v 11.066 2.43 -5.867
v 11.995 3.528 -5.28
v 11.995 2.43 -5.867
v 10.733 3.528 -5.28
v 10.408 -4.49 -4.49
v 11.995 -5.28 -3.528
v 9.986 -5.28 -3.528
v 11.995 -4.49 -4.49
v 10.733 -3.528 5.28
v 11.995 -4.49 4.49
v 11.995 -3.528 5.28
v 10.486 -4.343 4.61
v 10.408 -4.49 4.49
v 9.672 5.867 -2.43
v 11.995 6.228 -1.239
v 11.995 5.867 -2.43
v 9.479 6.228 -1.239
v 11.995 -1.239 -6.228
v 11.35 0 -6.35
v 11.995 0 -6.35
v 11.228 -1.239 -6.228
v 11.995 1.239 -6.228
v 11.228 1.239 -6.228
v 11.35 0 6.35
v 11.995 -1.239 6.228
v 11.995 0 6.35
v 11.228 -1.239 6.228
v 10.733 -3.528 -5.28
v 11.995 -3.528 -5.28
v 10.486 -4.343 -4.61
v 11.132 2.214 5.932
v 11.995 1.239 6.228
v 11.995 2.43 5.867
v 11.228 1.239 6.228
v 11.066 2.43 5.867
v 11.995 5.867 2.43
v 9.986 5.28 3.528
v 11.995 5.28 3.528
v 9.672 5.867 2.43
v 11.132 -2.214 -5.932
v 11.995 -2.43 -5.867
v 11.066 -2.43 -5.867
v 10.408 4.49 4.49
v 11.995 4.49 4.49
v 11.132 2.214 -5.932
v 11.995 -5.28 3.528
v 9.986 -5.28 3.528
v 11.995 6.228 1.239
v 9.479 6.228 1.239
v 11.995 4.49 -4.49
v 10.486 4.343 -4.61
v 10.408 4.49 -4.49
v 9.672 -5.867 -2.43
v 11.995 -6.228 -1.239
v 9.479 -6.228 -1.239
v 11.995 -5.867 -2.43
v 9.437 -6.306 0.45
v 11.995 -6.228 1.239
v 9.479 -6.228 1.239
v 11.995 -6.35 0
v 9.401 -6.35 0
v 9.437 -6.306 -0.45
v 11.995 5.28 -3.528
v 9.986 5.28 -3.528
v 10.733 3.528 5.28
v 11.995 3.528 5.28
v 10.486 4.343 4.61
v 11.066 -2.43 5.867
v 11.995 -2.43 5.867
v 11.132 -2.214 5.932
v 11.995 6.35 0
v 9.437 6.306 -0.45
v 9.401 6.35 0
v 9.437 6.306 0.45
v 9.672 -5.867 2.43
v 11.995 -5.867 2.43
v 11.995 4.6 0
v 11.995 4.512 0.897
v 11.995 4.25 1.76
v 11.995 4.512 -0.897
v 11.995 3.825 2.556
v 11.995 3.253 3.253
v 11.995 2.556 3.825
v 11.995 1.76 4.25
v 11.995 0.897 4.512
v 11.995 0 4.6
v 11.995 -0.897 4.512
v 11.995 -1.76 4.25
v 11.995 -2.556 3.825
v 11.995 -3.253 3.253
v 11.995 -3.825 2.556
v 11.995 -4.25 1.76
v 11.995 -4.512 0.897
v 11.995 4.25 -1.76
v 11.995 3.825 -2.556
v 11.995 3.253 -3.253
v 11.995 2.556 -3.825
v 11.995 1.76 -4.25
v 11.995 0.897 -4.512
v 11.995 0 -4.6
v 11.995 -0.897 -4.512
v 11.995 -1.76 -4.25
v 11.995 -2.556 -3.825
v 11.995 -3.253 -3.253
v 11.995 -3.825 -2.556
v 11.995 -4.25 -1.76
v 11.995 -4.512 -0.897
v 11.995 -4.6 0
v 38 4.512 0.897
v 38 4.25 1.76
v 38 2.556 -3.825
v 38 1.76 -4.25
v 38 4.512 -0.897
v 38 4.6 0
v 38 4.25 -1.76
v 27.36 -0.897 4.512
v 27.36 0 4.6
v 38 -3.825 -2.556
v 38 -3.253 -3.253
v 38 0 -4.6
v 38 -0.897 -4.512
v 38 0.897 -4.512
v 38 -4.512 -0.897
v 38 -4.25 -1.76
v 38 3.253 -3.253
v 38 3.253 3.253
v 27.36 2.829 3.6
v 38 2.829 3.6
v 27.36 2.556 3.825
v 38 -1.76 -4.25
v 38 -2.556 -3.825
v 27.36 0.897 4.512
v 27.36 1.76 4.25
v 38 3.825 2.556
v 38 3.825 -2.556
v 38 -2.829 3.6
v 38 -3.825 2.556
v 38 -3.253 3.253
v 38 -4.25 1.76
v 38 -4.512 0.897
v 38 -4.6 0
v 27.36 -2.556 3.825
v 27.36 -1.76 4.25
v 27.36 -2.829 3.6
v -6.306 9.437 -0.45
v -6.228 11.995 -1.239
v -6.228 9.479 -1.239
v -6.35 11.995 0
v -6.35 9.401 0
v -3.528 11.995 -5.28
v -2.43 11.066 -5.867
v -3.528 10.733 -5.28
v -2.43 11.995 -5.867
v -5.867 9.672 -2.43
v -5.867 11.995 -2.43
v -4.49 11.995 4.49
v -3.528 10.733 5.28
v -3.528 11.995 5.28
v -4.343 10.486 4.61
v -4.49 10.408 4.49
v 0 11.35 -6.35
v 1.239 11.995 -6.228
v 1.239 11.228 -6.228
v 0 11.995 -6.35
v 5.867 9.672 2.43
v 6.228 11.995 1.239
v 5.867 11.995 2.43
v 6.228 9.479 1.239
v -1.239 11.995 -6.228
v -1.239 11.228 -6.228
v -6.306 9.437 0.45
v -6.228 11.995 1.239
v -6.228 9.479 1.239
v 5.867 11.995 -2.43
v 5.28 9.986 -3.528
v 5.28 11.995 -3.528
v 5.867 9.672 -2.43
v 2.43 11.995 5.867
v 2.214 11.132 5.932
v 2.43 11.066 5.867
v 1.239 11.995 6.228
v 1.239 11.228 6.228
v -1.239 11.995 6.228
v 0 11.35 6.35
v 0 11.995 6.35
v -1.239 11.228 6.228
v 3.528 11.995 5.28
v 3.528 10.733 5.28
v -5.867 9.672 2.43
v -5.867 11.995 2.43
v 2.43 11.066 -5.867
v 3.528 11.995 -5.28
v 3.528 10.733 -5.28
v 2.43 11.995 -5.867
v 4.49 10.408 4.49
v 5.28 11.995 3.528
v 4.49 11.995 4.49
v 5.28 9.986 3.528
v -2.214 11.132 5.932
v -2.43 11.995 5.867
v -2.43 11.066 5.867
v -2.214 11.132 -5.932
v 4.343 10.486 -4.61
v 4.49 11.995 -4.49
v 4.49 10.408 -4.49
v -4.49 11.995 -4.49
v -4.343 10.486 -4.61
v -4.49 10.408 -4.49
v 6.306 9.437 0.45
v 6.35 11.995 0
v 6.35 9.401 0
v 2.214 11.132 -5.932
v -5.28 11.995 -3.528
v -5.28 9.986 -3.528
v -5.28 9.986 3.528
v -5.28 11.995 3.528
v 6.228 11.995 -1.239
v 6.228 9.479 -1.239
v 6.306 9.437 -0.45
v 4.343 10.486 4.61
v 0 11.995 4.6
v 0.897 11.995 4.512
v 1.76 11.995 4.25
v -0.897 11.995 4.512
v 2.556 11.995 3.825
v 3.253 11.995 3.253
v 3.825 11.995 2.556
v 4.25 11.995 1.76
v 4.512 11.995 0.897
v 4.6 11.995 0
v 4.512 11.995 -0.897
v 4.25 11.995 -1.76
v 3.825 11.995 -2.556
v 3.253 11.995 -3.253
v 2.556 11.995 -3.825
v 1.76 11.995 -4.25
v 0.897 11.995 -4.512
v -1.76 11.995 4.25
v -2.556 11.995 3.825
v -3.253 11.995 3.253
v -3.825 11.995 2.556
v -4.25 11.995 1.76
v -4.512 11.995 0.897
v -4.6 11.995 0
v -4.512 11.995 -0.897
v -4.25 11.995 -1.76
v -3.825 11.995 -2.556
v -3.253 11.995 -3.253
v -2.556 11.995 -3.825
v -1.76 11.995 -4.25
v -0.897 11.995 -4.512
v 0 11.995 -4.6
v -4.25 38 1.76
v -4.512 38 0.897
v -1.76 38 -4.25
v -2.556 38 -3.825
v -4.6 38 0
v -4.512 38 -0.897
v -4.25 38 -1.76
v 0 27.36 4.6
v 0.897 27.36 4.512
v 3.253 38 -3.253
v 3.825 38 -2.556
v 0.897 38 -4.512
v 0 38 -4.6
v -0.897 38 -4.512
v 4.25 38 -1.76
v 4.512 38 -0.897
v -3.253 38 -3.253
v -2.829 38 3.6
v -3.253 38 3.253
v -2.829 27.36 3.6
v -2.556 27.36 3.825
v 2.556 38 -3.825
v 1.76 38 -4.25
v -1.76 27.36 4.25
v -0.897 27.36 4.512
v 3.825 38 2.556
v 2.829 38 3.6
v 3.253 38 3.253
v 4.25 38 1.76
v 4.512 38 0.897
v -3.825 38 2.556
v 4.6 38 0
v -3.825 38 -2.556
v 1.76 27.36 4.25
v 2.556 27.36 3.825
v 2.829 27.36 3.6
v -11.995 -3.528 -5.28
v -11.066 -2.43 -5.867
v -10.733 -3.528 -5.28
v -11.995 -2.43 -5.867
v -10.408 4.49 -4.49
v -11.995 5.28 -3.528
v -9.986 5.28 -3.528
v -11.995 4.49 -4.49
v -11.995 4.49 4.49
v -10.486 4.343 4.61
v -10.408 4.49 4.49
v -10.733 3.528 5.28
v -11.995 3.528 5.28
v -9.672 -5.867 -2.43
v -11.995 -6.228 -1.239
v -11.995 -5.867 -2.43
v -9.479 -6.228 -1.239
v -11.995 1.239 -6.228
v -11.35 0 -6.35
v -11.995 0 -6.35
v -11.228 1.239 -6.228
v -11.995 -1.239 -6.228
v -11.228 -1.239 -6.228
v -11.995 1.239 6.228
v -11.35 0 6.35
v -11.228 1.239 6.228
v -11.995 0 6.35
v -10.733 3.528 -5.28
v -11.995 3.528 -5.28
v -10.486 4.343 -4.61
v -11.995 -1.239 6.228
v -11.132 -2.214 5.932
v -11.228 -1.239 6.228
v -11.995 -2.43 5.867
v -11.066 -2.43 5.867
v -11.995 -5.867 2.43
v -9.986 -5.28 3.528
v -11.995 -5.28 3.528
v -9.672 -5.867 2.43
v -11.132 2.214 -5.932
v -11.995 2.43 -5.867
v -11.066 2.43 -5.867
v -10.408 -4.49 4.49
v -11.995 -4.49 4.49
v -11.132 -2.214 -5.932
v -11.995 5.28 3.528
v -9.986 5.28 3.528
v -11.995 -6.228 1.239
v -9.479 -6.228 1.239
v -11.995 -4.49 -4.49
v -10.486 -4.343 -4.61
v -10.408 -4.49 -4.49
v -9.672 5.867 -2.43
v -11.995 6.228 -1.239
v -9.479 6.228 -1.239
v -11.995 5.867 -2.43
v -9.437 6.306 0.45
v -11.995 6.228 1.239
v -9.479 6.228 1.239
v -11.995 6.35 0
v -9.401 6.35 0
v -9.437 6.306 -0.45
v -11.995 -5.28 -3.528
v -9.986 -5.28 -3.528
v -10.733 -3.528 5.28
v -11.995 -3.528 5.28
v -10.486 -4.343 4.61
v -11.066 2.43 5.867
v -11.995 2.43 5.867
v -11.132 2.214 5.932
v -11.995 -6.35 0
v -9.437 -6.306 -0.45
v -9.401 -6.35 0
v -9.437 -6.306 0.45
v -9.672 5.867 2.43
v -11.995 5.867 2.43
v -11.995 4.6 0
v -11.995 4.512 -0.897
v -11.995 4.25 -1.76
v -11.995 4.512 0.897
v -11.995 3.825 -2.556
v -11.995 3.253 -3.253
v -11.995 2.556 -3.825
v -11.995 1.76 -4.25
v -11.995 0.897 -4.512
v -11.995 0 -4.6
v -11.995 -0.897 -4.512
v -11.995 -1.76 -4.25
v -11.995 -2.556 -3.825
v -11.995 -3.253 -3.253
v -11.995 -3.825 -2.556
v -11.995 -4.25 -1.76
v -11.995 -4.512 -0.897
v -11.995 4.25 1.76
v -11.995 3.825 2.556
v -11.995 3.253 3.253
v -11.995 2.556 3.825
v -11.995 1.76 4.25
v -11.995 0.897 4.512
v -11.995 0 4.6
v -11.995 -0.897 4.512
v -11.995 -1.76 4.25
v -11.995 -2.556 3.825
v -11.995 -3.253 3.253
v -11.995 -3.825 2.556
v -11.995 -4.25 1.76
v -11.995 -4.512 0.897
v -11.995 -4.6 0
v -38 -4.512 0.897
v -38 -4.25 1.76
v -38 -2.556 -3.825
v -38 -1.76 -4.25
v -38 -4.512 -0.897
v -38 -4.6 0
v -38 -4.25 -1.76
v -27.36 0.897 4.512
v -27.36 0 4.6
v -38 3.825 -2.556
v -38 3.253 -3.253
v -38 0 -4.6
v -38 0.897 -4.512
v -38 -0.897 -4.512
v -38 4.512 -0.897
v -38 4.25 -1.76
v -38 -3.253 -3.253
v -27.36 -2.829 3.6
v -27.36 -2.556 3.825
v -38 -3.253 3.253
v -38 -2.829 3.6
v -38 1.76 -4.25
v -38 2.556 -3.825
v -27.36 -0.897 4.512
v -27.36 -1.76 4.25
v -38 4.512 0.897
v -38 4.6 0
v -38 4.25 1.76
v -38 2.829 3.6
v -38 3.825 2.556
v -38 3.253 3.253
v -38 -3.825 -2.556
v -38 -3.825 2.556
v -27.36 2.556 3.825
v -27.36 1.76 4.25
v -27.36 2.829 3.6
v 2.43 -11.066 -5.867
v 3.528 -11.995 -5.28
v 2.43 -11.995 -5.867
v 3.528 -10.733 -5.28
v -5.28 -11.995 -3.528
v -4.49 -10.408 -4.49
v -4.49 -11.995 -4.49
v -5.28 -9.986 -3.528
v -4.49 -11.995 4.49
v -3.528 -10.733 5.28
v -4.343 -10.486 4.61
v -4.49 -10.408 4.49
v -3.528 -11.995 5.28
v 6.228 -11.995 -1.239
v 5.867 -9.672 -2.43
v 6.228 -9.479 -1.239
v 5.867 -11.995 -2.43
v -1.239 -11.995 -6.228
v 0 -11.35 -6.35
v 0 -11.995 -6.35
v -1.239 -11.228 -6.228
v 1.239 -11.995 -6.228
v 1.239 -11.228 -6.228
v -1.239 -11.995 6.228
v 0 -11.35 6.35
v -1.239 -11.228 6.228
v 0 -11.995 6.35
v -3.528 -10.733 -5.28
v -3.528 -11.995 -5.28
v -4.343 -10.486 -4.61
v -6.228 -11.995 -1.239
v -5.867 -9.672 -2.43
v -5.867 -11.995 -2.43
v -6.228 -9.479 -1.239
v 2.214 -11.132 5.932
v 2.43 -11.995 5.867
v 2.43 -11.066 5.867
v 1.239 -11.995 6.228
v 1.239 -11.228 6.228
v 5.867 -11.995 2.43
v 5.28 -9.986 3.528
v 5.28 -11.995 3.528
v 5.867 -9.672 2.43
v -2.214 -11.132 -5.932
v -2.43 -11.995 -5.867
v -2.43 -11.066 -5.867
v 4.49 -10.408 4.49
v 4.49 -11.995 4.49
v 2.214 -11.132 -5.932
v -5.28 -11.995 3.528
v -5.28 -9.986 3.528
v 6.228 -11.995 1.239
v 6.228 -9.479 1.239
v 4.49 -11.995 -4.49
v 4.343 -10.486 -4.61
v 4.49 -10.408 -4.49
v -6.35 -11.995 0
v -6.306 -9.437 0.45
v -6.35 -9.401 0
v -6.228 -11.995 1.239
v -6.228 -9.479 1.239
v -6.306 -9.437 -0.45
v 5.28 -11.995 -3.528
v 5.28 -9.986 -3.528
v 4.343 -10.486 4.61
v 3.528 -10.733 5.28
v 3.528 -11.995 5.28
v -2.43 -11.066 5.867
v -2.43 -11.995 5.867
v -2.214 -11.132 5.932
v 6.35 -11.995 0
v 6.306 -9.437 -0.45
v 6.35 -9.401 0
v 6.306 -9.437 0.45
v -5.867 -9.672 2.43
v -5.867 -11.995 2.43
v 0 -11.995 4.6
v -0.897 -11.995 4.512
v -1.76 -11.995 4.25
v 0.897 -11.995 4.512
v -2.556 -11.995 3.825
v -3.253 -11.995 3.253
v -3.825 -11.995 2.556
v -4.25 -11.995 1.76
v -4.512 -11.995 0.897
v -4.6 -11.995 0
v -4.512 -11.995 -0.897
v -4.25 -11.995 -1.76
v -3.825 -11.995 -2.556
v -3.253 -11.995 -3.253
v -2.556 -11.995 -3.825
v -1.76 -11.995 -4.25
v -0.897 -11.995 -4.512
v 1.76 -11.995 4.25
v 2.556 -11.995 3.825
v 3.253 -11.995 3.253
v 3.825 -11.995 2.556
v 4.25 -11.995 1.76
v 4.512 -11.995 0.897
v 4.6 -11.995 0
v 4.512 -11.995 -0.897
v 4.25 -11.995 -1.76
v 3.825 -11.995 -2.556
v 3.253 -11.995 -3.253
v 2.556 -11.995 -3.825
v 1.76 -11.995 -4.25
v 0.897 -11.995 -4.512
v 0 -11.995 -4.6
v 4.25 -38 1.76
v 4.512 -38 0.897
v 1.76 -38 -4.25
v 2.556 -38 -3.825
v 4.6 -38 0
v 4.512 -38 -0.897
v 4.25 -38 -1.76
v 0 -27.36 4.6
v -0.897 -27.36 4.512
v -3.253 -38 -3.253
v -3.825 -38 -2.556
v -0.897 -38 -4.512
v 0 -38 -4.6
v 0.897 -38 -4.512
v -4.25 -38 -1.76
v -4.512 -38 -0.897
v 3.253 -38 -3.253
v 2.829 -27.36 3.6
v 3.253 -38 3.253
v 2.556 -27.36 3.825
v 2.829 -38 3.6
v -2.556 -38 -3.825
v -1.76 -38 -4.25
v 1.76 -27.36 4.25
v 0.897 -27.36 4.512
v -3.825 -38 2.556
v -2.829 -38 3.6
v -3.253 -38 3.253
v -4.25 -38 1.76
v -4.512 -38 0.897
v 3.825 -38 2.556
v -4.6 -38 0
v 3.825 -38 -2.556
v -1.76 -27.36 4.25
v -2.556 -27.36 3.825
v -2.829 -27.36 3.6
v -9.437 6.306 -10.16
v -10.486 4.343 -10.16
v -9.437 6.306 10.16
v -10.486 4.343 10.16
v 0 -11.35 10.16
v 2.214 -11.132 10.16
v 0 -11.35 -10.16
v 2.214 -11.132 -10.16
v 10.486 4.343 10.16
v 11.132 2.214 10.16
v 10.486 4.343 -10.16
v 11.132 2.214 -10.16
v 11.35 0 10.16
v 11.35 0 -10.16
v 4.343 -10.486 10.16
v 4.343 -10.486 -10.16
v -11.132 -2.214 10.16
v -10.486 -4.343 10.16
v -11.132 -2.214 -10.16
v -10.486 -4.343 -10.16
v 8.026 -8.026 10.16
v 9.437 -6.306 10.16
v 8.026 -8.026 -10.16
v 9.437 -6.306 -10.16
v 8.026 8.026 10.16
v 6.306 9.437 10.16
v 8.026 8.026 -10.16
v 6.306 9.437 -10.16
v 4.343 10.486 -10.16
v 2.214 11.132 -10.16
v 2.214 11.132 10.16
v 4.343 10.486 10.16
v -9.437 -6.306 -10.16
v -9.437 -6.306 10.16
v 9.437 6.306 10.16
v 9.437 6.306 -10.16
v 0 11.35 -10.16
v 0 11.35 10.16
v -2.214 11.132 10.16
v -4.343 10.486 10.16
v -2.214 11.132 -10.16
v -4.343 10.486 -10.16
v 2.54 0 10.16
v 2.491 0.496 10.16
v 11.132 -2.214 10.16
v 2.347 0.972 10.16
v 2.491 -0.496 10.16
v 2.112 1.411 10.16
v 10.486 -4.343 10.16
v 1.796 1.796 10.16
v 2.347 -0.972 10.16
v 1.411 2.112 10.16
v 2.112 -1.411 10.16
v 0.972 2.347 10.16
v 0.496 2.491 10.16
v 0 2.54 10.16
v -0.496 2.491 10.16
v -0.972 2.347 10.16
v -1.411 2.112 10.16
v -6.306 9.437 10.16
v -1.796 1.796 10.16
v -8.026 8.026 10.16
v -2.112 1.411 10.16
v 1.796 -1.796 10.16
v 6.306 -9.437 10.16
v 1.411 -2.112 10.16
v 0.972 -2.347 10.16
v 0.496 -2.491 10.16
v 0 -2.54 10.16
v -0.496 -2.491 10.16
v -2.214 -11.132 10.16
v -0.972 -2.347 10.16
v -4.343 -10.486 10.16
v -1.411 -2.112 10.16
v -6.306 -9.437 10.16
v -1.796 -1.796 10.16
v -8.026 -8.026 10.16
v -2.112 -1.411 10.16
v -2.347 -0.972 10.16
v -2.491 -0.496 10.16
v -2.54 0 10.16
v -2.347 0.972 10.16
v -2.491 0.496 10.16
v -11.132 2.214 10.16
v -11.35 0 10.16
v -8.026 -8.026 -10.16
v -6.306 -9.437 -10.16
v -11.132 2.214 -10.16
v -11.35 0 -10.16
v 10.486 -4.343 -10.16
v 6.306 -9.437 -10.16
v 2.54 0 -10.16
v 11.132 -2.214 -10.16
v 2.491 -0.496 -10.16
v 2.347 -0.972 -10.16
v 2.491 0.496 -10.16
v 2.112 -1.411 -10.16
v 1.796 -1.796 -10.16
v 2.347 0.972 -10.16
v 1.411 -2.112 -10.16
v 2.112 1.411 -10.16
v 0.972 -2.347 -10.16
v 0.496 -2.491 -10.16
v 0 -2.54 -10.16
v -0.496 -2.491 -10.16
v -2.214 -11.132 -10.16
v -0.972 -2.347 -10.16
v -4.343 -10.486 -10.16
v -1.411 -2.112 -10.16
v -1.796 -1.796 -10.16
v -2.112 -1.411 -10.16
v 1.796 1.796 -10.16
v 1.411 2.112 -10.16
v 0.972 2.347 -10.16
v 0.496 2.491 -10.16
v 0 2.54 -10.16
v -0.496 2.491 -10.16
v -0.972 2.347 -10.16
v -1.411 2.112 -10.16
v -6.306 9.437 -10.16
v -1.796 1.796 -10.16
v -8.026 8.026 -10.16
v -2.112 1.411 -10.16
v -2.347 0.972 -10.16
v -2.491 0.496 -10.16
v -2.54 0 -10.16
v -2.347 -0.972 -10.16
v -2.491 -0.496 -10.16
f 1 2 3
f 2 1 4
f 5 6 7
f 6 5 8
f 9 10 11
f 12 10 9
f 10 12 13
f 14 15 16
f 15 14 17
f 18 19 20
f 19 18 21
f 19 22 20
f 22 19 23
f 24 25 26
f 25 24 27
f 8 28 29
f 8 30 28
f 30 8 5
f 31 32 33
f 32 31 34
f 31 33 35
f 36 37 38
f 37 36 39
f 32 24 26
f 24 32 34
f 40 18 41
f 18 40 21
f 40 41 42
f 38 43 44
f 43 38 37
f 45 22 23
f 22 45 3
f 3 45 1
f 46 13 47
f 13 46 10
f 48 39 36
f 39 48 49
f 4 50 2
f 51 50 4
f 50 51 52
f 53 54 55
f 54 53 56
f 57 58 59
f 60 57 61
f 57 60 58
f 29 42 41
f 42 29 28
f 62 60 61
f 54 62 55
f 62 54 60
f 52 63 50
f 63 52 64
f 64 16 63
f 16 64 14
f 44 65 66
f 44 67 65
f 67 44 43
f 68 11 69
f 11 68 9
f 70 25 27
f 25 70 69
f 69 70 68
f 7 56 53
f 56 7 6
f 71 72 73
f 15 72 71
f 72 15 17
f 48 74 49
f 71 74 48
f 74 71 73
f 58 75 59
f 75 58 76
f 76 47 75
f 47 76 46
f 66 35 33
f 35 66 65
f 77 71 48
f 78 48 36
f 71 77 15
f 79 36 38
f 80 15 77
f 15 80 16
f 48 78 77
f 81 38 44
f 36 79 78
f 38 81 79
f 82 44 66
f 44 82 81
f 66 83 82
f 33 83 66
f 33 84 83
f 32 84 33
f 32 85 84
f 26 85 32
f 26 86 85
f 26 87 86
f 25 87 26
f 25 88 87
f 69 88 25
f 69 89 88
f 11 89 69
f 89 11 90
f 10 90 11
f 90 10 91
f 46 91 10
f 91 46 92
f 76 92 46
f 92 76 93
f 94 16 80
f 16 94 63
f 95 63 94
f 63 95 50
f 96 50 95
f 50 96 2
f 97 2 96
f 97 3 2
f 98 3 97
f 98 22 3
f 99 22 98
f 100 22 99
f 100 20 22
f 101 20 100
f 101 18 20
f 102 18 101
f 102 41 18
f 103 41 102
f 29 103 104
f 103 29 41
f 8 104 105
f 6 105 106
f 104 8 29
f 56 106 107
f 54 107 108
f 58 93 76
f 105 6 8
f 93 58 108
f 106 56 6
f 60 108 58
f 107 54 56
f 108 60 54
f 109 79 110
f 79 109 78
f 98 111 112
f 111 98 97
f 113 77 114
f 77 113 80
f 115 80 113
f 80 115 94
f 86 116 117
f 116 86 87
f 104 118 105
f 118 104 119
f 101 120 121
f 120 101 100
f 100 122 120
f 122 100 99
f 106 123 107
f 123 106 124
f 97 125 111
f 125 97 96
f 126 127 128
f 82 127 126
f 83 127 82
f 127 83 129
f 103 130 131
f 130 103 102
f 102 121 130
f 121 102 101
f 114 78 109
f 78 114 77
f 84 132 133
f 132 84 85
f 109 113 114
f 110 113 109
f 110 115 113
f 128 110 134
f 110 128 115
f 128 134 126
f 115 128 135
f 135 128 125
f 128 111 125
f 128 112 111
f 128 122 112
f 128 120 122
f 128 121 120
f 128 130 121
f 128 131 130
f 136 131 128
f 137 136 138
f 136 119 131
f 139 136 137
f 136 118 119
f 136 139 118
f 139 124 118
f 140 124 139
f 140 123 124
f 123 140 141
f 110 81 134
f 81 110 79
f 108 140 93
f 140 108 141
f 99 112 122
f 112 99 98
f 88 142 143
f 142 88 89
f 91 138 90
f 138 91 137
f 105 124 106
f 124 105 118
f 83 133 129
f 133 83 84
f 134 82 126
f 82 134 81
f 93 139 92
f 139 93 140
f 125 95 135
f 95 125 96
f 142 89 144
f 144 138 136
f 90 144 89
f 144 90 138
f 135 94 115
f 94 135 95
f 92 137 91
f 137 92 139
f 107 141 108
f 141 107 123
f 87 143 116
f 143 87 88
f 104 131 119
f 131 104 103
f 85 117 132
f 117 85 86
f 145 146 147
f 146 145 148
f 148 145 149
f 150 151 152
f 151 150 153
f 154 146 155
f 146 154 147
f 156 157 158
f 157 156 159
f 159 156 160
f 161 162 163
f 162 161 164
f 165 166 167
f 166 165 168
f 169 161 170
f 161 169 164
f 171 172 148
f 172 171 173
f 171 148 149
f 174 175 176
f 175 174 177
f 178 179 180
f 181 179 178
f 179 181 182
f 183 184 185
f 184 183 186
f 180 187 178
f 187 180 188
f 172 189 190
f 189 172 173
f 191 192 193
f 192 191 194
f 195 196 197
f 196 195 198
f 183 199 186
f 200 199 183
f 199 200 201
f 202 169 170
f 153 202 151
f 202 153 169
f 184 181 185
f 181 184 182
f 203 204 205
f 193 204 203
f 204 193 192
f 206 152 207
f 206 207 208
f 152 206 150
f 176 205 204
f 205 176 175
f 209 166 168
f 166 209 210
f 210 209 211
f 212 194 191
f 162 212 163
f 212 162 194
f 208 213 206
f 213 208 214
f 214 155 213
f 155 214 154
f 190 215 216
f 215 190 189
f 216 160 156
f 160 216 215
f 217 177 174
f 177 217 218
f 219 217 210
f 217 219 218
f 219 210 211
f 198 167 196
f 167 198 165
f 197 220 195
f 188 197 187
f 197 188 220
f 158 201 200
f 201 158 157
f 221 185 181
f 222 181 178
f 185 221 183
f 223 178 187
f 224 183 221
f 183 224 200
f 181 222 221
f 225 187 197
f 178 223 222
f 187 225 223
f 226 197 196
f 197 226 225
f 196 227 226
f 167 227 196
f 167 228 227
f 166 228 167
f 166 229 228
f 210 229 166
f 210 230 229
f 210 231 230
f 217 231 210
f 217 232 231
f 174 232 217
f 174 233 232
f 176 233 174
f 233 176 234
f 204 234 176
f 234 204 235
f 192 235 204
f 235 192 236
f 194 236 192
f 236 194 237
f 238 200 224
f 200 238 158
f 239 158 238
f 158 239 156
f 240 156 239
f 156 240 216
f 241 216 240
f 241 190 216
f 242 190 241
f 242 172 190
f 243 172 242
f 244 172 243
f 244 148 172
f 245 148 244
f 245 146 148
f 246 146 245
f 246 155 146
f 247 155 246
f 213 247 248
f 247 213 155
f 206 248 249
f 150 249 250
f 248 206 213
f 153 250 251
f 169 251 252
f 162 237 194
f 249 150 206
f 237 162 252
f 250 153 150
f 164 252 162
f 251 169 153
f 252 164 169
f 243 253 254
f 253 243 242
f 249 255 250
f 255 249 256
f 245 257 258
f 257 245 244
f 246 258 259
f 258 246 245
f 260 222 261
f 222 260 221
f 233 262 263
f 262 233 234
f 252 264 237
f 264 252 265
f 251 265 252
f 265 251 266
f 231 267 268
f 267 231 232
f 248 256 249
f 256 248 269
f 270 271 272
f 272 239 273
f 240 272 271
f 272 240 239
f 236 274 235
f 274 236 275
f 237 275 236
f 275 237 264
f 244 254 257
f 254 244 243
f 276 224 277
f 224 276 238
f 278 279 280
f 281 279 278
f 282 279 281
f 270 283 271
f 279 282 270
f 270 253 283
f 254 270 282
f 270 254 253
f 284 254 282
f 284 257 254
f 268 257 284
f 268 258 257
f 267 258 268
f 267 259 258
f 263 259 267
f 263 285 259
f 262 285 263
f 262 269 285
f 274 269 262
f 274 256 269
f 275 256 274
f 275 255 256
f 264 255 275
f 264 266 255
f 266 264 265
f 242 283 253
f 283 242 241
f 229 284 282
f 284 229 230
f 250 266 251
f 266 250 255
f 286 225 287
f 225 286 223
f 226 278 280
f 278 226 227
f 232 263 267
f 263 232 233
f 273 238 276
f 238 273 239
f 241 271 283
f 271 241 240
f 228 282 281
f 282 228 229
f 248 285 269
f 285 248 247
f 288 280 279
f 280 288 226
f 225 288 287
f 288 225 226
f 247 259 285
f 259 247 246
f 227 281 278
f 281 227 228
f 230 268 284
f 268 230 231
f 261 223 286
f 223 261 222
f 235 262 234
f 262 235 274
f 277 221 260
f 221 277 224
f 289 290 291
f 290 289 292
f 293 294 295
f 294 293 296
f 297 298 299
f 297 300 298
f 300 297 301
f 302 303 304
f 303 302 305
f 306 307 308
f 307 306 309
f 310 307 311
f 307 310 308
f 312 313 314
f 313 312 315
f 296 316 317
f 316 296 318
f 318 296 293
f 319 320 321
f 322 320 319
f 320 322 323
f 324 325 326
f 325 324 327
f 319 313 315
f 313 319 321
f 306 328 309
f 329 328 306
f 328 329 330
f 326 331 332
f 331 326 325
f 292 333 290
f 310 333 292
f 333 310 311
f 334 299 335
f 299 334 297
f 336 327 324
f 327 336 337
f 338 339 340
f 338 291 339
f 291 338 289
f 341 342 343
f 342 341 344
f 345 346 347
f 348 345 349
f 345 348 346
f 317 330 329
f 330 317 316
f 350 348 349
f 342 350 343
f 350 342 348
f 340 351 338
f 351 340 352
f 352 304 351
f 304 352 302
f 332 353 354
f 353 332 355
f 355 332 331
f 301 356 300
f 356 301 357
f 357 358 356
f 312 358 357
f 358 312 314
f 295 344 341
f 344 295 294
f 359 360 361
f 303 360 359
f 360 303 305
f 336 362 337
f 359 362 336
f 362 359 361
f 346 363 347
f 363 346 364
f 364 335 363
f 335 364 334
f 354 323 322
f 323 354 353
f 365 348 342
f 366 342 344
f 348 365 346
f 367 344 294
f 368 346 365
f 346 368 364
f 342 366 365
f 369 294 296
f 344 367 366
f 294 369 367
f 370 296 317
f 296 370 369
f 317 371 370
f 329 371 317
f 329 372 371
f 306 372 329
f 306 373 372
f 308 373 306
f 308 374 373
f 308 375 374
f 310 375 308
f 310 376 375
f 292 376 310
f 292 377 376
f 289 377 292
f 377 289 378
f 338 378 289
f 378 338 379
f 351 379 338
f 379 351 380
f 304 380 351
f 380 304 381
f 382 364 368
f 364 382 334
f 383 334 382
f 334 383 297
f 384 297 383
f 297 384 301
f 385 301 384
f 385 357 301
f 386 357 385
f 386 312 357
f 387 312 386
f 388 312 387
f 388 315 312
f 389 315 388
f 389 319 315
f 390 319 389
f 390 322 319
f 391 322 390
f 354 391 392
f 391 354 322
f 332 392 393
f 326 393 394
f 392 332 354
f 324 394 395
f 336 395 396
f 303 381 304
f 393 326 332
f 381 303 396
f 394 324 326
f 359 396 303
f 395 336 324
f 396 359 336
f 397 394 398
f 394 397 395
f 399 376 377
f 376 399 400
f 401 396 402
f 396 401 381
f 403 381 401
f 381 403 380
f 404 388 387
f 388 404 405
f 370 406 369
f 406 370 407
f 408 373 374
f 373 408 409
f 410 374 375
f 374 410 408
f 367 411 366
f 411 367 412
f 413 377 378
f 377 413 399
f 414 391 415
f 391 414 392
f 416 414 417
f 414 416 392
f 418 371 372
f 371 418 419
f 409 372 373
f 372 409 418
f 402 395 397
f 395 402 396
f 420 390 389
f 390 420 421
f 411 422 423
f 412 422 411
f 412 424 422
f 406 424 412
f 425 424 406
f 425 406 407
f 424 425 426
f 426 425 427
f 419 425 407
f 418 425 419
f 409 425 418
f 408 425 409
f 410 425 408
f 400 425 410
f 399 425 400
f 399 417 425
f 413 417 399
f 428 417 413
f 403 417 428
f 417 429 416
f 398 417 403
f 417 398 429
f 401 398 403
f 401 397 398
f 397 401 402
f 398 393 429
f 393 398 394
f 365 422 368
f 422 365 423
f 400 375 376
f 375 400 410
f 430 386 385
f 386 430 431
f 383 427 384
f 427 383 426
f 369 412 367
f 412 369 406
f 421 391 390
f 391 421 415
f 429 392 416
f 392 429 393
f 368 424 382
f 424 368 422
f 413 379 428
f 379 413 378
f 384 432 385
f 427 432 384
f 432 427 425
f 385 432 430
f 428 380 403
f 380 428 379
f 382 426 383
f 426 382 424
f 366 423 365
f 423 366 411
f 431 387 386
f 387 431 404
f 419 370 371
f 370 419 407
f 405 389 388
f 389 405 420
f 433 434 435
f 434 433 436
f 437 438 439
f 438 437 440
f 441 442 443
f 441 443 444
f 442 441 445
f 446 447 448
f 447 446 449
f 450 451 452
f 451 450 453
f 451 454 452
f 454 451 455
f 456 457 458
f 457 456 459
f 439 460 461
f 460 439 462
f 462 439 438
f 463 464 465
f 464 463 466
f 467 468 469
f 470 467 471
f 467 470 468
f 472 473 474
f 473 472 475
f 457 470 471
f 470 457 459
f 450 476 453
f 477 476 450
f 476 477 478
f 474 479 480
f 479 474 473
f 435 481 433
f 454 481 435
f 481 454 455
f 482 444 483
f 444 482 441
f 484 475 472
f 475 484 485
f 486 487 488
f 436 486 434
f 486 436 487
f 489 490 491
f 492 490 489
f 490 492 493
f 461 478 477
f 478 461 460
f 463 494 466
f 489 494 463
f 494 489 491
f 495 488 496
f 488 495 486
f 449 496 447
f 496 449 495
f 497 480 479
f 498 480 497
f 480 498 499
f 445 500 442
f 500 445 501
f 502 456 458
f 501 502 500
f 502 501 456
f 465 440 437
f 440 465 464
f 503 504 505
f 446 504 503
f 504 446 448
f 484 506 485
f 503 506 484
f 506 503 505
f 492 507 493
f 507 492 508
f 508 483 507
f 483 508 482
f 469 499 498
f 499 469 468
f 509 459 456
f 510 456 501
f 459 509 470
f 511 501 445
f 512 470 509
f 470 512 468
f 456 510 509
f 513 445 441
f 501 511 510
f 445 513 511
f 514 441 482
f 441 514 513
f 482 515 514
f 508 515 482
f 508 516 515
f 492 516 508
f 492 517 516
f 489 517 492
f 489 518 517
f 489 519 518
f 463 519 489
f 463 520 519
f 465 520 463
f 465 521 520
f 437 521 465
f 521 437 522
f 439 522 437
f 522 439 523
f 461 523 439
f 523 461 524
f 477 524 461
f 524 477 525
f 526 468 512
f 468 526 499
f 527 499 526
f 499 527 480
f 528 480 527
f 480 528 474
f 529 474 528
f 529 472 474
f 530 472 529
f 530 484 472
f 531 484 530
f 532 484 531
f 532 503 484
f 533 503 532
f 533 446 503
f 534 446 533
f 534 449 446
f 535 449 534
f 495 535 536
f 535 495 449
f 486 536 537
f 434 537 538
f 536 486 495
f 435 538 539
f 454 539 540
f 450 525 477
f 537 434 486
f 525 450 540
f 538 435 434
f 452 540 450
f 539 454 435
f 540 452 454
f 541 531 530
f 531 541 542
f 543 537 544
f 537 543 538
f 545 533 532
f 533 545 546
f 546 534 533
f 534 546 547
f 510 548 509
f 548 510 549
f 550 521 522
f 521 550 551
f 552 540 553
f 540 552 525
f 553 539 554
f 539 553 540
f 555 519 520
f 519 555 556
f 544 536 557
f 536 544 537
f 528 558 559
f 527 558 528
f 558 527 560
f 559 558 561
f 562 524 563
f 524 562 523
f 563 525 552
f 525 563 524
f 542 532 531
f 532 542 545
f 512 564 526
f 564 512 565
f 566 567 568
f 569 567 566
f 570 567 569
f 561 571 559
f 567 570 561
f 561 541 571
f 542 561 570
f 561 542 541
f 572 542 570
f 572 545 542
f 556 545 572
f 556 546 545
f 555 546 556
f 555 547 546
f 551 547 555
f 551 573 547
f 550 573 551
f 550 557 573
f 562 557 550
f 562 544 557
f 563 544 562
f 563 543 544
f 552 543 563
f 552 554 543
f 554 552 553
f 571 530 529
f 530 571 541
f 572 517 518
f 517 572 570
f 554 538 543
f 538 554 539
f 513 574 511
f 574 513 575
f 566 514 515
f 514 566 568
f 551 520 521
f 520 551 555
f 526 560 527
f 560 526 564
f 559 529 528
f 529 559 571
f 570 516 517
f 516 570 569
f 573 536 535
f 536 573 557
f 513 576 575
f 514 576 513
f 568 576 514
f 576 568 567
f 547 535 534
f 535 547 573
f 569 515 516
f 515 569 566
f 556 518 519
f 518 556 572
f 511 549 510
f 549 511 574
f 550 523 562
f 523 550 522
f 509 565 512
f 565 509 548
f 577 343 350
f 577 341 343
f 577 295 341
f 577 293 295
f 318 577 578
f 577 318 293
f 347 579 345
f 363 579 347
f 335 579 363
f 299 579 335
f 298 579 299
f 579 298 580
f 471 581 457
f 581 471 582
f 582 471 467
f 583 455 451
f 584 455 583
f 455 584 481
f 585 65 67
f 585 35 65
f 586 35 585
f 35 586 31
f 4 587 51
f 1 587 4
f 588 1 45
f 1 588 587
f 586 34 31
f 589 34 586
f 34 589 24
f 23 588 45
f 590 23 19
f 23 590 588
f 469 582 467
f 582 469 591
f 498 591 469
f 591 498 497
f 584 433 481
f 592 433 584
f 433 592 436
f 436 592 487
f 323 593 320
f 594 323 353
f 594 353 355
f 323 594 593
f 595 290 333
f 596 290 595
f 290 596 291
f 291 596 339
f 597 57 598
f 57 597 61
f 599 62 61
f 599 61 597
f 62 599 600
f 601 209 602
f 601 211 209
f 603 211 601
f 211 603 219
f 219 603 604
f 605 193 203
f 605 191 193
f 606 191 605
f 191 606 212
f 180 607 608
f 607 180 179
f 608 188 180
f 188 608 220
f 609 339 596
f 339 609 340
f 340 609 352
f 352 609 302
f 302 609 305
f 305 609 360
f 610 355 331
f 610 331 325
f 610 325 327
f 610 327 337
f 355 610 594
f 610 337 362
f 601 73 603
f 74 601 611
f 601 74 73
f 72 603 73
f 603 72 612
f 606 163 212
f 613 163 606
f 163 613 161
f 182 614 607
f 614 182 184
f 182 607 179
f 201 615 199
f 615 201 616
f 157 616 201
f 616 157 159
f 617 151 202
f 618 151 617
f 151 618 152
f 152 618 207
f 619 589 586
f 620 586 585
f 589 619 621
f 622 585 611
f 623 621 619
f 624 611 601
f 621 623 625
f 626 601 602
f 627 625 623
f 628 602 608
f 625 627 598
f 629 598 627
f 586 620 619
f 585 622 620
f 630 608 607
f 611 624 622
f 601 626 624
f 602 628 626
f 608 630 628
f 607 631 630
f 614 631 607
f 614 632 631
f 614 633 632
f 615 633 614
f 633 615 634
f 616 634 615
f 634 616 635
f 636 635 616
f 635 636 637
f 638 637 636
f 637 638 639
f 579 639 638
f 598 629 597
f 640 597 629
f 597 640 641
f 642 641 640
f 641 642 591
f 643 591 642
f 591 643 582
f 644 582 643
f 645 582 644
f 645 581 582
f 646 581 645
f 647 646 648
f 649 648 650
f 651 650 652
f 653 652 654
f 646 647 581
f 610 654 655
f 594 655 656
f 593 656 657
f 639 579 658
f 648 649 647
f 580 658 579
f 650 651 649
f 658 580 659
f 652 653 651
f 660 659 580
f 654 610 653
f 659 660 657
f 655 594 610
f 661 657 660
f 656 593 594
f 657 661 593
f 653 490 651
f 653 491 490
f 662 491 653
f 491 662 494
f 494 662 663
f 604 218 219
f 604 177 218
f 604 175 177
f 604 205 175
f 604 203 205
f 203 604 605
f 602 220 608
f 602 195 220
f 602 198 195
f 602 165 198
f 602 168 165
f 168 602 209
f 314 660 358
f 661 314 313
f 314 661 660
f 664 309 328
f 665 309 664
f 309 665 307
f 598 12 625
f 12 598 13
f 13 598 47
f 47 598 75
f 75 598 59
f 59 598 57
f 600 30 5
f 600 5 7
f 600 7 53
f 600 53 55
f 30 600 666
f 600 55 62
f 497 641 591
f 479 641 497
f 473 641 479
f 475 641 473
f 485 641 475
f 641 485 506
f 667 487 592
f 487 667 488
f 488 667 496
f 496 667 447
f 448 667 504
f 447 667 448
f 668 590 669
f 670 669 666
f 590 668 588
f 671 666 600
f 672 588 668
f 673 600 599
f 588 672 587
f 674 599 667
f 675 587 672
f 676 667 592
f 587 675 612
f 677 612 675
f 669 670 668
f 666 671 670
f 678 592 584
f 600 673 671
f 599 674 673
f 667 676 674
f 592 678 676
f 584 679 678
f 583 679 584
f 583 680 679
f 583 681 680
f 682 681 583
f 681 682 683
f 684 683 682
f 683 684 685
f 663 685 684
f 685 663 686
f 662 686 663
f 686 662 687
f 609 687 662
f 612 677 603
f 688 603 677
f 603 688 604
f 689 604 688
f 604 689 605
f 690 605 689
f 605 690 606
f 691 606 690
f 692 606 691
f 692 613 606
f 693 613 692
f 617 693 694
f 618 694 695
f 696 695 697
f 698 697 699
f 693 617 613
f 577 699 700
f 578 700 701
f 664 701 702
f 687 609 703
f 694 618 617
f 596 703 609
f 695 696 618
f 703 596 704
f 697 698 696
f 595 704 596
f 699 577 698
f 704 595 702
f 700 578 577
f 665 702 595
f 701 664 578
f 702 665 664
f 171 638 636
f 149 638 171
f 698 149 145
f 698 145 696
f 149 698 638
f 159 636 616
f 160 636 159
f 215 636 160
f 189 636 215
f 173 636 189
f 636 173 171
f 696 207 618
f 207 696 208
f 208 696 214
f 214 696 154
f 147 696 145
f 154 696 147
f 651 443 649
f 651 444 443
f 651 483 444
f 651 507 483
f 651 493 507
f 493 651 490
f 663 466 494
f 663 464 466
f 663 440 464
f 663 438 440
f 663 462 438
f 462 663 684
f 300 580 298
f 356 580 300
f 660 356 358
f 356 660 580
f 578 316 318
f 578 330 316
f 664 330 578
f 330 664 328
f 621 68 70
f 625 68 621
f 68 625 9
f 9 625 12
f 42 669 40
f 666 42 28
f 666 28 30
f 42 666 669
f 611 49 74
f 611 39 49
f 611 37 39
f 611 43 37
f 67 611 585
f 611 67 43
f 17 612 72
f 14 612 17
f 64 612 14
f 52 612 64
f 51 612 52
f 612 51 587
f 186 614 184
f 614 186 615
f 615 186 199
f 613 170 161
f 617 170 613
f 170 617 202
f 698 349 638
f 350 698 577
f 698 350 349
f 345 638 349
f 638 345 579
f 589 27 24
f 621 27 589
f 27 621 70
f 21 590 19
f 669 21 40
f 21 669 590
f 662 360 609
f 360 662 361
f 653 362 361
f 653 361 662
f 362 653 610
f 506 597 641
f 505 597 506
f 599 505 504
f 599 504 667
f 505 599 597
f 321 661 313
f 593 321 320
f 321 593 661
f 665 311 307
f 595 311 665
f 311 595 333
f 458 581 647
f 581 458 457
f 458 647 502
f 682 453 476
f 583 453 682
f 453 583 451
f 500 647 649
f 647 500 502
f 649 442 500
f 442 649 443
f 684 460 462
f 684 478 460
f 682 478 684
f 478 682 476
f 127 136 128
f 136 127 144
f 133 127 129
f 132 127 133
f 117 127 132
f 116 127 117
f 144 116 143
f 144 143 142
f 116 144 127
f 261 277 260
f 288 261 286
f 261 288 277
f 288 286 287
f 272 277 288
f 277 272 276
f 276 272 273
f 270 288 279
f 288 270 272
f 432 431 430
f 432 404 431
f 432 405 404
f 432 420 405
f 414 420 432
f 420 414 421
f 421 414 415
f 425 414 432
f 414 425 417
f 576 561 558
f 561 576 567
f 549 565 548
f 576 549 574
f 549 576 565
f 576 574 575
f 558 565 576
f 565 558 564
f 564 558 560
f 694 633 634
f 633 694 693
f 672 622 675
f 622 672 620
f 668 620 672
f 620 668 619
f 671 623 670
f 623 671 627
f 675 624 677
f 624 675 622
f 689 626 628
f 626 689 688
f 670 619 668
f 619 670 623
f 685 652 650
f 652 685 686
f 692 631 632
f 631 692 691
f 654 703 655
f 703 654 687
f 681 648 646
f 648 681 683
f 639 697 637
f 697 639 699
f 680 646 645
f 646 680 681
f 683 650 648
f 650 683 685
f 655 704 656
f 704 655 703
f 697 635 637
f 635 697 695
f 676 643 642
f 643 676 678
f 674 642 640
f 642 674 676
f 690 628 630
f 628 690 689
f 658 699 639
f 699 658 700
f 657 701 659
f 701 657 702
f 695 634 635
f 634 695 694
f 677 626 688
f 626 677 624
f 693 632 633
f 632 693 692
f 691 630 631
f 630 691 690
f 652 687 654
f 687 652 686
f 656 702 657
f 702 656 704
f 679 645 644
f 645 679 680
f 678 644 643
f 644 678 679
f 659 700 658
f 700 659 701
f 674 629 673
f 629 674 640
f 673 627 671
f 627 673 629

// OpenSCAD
$fn = 32;

// ----------------------------------------------------------------------
// Cardan cross: 76 mm span, 12.7 mm trunnions
// ----------------------------------------------------------------------

// --- parameters (mm) ---
journal_d = 12.7;         // trunnion diameter
arm_len = 38;             // trunnion length from the centre
step_r = 4.32;            // step position from the centre
step_d = 9.2;             // journal diameter after the step
hub_d = 22.7;             // hub diameter
hub_h = 20.32;            // hub height
bore_d = 5.08;            // hub bore
flat_d = 1;               // depth of the journal flat
flat_len = 10.64;         // length of the journal flat

difference() {
  union() {
    /* hub along the joint axis */
    cylinder(h = hub_h, d = hub_d, center = true);
    for (a = [0 : 90 : 270]) rotate([0, 0, a]) {
      /* trunnion, sunk into the hub */
      translate([hub_d / 4, 0, 0]) rotate([0, 90, 0]) cylinder(h = step_r + 2, d = journal_d);
      /* stepped journal out to the tip */
      translate([step_r - 0.5, 0, 0]) rotate([0, 90, 0]) cylinder(h = arm_len + 0.5 - step_r, d = step_d);
    }
  }
  /* lubrication bore through the hub, 2.5 mm clear on both sides */
  translate([0, 0, -hub_h / 2 - 2.5]) cylinder(h = hub_h + 5, d = bore_d);
  /* machined flat on each journal tip */
  for (a = [0 : 90 : 270]) rotate([0, 0, a]) {
    translate([arm_len - flat_len, -step_d, step_d / 2 - flat_d]) cube([flat_len + 0.5, 2 * step_d, flat_d + 2.5]);
  }
}
